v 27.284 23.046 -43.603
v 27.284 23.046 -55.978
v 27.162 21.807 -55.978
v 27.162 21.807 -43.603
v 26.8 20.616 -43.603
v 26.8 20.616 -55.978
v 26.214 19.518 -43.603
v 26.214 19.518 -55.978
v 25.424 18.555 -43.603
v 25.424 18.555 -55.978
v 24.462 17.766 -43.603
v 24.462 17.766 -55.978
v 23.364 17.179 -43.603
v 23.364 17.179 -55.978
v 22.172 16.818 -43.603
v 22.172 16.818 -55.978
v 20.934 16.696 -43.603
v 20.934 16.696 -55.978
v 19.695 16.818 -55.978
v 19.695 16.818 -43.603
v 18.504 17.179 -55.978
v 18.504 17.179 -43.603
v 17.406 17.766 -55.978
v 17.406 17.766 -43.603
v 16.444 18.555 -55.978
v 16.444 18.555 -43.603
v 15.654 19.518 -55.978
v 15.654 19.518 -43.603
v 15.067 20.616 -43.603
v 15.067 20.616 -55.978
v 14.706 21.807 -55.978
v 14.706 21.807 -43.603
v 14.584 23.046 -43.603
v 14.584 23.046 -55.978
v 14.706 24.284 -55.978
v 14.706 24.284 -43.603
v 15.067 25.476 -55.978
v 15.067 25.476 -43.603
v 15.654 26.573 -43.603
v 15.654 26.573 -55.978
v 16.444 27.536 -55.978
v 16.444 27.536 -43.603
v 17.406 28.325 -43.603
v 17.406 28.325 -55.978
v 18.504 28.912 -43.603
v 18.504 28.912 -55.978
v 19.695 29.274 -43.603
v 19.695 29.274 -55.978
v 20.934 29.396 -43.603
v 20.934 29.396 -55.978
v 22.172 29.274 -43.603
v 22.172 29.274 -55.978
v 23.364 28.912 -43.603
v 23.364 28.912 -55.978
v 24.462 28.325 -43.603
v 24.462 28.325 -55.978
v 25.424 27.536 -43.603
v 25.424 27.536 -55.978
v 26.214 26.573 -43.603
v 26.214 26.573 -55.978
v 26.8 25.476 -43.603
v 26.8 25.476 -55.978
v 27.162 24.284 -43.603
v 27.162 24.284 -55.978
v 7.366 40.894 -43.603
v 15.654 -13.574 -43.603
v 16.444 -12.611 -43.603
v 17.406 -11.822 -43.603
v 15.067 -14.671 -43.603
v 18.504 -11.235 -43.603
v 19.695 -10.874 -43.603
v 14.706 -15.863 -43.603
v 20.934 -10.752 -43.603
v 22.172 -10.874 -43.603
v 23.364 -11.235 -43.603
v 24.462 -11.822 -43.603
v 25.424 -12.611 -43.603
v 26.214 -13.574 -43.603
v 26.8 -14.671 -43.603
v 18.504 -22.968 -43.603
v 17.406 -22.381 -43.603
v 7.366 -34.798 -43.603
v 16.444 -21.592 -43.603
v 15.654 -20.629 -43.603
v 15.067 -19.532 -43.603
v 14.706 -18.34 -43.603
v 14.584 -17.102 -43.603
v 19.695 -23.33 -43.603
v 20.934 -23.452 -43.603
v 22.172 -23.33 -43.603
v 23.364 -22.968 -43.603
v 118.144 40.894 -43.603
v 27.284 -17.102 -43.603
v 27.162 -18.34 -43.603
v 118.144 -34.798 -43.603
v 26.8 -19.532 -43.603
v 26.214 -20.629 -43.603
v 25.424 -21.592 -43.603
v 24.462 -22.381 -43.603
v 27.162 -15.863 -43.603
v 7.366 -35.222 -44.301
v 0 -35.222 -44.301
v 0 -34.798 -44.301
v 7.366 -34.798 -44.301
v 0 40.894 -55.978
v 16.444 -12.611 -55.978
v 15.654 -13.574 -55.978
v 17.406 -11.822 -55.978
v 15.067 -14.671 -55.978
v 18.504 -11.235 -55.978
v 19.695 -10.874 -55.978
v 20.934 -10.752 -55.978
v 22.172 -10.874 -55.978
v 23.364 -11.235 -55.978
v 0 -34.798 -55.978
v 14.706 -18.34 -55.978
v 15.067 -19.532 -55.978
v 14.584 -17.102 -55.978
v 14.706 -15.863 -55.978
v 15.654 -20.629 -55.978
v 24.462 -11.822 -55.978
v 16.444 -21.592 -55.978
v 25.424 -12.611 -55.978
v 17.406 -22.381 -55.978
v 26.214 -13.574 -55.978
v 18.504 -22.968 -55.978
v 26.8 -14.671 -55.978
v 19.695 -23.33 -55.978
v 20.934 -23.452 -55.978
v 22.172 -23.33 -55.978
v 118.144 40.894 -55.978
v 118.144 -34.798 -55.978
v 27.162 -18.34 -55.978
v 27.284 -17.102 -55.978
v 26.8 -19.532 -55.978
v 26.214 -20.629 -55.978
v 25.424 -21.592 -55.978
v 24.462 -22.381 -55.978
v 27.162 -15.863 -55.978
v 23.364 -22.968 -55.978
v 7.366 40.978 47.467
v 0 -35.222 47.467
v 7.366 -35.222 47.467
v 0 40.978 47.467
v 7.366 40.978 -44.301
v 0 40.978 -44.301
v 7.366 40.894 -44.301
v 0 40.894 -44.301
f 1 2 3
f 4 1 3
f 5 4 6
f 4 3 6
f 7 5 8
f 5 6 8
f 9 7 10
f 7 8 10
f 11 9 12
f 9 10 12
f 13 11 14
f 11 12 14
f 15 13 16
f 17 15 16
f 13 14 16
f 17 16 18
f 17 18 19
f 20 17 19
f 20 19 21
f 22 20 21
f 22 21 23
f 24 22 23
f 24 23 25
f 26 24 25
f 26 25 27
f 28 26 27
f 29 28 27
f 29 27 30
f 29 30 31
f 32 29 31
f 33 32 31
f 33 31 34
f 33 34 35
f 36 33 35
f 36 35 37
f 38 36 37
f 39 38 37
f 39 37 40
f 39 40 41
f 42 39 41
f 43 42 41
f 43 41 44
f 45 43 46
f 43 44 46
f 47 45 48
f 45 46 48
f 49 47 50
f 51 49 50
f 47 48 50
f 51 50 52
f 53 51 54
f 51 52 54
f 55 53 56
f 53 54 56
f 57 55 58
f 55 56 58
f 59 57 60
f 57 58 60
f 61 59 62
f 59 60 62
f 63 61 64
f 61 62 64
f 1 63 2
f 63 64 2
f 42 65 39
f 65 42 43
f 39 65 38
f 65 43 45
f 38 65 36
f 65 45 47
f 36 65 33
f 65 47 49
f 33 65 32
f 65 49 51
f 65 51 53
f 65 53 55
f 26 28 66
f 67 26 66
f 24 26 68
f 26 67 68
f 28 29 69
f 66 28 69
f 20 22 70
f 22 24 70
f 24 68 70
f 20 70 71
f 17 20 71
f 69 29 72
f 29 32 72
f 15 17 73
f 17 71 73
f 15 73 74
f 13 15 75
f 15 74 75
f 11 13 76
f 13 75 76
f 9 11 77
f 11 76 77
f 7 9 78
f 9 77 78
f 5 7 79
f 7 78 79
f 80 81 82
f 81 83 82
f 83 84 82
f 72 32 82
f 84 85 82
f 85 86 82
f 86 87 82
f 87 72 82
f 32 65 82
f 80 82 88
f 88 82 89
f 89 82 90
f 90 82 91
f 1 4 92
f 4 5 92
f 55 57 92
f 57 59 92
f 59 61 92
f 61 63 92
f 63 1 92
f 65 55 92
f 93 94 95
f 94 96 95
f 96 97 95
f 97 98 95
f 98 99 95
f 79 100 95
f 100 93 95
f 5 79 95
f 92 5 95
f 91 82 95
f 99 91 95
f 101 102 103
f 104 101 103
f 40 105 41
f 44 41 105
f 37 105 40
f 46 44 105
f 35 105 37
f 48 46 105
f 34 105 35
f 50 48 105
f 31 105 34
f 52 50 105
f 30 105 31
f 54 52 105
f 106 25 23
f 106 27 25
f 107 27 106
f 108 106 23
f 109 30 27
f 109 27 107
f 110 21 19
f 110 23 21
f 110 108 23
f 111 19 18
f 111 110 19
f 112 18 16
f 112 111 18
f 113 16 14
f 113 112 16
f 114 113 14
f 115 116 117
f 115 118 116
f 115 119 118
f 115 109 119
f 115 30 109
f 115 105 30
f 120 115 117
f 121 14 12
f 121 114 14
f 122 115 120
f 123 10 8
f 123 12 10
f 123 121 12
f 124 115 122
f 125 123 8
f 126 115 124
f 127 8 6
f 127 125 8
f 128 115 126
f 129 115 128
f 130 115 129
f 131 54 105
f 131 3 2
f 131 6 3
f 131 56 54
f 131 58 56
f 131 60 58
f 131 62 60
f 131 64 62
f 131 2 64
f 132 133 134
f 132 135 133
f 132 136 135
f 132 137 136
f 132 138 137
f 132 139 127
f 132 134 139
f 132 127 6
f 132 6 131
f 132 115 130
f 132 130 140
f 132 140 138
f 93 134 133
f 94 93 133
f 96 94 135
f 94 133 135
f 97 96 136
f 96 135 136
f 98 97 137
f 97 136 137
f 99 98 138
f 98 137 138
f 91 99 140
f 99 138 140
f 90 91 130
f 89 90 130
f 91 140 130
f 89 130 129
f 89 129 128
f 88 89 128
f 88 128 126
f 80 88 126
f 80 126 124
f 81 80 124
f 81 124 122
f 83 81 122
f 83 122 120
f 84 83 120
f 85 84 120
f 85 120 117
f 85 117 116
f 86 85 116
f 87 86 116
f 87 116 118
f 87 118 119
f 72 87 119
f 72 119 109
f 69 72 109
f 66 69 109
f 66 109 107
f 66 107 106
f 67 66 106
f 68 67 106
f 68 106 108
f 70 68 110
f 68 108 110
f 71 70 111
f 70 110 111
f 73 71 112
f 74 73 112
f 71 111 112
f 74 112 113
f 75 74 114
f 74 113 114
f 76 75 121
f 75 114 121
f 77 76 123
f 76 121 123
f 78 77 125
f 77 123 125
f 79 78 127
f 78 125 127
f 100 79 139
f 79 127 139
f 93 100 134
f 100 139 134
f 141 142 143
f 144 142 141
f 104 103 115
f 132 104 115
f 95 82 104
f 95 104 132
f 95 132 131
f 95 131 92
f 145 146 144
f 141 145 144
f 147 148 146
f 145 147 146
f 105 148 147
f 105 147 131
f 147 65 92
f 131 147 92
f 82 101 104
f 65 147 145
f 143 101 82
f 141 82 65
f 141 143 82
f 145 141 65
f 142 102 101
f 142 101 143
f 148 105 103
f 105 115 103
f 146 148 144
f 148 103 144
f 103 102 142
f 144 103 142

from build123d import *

# Parameters (mm, degrees)
F0_W     = 76.2
F0_H     = 91.7677478655
F1_DEPTH = 7.366
F2_W     = 118.1442663074
F2_H     = 12.3756490648
F3_DEPTH = 34.798
F4_DEPTH = 40.894
F5_R     = 6.35
F6_DEPTH = 25.4


with BuildPart() as f1:
    # F0 (on Right) → F1 (new body)
    with BuildSketch(Plane.YZ):
        with Locations((2.8780587018, 1.5829317272)):
            Rectangle(F0_W, F0_H)
    extrude(amount=F1_DEPTH)

    # F2 (on Front) → F3 (join)
    with BuildSketch(Plane.XZ):
        with Locations((59.0721331537, -49.7903954238)):
            Rectangle(F2_W, F2_H)
    extrude(amount=F3_DEPTH)

    # F2 (on Front) → F4 (join)
    with BuildSketch(Plane.XZ):
        with Locations((59.0721331537, -49.7903954238)):
            Rectangle(F2_W, F2_H)
    extrude(amount=-F4_DEPTH)

    # F5 (on face) → F6 (cut)
    with BuildSketch(Plane(origin=(0, 0, -55.9782199562), x_dir=(1, 0, 0), z_dir=(0, 0, -1))):
        with Locations((20.9336709231, -23.0455552376)):
            Circle(F5_R)
        with Locations((20.9336709231, 17.1015182538)):
            Circle(F5_R)
    extrude(amount=-F6_DEPTH, mode=Mode.SUBTRACT)


solid = f1.part
